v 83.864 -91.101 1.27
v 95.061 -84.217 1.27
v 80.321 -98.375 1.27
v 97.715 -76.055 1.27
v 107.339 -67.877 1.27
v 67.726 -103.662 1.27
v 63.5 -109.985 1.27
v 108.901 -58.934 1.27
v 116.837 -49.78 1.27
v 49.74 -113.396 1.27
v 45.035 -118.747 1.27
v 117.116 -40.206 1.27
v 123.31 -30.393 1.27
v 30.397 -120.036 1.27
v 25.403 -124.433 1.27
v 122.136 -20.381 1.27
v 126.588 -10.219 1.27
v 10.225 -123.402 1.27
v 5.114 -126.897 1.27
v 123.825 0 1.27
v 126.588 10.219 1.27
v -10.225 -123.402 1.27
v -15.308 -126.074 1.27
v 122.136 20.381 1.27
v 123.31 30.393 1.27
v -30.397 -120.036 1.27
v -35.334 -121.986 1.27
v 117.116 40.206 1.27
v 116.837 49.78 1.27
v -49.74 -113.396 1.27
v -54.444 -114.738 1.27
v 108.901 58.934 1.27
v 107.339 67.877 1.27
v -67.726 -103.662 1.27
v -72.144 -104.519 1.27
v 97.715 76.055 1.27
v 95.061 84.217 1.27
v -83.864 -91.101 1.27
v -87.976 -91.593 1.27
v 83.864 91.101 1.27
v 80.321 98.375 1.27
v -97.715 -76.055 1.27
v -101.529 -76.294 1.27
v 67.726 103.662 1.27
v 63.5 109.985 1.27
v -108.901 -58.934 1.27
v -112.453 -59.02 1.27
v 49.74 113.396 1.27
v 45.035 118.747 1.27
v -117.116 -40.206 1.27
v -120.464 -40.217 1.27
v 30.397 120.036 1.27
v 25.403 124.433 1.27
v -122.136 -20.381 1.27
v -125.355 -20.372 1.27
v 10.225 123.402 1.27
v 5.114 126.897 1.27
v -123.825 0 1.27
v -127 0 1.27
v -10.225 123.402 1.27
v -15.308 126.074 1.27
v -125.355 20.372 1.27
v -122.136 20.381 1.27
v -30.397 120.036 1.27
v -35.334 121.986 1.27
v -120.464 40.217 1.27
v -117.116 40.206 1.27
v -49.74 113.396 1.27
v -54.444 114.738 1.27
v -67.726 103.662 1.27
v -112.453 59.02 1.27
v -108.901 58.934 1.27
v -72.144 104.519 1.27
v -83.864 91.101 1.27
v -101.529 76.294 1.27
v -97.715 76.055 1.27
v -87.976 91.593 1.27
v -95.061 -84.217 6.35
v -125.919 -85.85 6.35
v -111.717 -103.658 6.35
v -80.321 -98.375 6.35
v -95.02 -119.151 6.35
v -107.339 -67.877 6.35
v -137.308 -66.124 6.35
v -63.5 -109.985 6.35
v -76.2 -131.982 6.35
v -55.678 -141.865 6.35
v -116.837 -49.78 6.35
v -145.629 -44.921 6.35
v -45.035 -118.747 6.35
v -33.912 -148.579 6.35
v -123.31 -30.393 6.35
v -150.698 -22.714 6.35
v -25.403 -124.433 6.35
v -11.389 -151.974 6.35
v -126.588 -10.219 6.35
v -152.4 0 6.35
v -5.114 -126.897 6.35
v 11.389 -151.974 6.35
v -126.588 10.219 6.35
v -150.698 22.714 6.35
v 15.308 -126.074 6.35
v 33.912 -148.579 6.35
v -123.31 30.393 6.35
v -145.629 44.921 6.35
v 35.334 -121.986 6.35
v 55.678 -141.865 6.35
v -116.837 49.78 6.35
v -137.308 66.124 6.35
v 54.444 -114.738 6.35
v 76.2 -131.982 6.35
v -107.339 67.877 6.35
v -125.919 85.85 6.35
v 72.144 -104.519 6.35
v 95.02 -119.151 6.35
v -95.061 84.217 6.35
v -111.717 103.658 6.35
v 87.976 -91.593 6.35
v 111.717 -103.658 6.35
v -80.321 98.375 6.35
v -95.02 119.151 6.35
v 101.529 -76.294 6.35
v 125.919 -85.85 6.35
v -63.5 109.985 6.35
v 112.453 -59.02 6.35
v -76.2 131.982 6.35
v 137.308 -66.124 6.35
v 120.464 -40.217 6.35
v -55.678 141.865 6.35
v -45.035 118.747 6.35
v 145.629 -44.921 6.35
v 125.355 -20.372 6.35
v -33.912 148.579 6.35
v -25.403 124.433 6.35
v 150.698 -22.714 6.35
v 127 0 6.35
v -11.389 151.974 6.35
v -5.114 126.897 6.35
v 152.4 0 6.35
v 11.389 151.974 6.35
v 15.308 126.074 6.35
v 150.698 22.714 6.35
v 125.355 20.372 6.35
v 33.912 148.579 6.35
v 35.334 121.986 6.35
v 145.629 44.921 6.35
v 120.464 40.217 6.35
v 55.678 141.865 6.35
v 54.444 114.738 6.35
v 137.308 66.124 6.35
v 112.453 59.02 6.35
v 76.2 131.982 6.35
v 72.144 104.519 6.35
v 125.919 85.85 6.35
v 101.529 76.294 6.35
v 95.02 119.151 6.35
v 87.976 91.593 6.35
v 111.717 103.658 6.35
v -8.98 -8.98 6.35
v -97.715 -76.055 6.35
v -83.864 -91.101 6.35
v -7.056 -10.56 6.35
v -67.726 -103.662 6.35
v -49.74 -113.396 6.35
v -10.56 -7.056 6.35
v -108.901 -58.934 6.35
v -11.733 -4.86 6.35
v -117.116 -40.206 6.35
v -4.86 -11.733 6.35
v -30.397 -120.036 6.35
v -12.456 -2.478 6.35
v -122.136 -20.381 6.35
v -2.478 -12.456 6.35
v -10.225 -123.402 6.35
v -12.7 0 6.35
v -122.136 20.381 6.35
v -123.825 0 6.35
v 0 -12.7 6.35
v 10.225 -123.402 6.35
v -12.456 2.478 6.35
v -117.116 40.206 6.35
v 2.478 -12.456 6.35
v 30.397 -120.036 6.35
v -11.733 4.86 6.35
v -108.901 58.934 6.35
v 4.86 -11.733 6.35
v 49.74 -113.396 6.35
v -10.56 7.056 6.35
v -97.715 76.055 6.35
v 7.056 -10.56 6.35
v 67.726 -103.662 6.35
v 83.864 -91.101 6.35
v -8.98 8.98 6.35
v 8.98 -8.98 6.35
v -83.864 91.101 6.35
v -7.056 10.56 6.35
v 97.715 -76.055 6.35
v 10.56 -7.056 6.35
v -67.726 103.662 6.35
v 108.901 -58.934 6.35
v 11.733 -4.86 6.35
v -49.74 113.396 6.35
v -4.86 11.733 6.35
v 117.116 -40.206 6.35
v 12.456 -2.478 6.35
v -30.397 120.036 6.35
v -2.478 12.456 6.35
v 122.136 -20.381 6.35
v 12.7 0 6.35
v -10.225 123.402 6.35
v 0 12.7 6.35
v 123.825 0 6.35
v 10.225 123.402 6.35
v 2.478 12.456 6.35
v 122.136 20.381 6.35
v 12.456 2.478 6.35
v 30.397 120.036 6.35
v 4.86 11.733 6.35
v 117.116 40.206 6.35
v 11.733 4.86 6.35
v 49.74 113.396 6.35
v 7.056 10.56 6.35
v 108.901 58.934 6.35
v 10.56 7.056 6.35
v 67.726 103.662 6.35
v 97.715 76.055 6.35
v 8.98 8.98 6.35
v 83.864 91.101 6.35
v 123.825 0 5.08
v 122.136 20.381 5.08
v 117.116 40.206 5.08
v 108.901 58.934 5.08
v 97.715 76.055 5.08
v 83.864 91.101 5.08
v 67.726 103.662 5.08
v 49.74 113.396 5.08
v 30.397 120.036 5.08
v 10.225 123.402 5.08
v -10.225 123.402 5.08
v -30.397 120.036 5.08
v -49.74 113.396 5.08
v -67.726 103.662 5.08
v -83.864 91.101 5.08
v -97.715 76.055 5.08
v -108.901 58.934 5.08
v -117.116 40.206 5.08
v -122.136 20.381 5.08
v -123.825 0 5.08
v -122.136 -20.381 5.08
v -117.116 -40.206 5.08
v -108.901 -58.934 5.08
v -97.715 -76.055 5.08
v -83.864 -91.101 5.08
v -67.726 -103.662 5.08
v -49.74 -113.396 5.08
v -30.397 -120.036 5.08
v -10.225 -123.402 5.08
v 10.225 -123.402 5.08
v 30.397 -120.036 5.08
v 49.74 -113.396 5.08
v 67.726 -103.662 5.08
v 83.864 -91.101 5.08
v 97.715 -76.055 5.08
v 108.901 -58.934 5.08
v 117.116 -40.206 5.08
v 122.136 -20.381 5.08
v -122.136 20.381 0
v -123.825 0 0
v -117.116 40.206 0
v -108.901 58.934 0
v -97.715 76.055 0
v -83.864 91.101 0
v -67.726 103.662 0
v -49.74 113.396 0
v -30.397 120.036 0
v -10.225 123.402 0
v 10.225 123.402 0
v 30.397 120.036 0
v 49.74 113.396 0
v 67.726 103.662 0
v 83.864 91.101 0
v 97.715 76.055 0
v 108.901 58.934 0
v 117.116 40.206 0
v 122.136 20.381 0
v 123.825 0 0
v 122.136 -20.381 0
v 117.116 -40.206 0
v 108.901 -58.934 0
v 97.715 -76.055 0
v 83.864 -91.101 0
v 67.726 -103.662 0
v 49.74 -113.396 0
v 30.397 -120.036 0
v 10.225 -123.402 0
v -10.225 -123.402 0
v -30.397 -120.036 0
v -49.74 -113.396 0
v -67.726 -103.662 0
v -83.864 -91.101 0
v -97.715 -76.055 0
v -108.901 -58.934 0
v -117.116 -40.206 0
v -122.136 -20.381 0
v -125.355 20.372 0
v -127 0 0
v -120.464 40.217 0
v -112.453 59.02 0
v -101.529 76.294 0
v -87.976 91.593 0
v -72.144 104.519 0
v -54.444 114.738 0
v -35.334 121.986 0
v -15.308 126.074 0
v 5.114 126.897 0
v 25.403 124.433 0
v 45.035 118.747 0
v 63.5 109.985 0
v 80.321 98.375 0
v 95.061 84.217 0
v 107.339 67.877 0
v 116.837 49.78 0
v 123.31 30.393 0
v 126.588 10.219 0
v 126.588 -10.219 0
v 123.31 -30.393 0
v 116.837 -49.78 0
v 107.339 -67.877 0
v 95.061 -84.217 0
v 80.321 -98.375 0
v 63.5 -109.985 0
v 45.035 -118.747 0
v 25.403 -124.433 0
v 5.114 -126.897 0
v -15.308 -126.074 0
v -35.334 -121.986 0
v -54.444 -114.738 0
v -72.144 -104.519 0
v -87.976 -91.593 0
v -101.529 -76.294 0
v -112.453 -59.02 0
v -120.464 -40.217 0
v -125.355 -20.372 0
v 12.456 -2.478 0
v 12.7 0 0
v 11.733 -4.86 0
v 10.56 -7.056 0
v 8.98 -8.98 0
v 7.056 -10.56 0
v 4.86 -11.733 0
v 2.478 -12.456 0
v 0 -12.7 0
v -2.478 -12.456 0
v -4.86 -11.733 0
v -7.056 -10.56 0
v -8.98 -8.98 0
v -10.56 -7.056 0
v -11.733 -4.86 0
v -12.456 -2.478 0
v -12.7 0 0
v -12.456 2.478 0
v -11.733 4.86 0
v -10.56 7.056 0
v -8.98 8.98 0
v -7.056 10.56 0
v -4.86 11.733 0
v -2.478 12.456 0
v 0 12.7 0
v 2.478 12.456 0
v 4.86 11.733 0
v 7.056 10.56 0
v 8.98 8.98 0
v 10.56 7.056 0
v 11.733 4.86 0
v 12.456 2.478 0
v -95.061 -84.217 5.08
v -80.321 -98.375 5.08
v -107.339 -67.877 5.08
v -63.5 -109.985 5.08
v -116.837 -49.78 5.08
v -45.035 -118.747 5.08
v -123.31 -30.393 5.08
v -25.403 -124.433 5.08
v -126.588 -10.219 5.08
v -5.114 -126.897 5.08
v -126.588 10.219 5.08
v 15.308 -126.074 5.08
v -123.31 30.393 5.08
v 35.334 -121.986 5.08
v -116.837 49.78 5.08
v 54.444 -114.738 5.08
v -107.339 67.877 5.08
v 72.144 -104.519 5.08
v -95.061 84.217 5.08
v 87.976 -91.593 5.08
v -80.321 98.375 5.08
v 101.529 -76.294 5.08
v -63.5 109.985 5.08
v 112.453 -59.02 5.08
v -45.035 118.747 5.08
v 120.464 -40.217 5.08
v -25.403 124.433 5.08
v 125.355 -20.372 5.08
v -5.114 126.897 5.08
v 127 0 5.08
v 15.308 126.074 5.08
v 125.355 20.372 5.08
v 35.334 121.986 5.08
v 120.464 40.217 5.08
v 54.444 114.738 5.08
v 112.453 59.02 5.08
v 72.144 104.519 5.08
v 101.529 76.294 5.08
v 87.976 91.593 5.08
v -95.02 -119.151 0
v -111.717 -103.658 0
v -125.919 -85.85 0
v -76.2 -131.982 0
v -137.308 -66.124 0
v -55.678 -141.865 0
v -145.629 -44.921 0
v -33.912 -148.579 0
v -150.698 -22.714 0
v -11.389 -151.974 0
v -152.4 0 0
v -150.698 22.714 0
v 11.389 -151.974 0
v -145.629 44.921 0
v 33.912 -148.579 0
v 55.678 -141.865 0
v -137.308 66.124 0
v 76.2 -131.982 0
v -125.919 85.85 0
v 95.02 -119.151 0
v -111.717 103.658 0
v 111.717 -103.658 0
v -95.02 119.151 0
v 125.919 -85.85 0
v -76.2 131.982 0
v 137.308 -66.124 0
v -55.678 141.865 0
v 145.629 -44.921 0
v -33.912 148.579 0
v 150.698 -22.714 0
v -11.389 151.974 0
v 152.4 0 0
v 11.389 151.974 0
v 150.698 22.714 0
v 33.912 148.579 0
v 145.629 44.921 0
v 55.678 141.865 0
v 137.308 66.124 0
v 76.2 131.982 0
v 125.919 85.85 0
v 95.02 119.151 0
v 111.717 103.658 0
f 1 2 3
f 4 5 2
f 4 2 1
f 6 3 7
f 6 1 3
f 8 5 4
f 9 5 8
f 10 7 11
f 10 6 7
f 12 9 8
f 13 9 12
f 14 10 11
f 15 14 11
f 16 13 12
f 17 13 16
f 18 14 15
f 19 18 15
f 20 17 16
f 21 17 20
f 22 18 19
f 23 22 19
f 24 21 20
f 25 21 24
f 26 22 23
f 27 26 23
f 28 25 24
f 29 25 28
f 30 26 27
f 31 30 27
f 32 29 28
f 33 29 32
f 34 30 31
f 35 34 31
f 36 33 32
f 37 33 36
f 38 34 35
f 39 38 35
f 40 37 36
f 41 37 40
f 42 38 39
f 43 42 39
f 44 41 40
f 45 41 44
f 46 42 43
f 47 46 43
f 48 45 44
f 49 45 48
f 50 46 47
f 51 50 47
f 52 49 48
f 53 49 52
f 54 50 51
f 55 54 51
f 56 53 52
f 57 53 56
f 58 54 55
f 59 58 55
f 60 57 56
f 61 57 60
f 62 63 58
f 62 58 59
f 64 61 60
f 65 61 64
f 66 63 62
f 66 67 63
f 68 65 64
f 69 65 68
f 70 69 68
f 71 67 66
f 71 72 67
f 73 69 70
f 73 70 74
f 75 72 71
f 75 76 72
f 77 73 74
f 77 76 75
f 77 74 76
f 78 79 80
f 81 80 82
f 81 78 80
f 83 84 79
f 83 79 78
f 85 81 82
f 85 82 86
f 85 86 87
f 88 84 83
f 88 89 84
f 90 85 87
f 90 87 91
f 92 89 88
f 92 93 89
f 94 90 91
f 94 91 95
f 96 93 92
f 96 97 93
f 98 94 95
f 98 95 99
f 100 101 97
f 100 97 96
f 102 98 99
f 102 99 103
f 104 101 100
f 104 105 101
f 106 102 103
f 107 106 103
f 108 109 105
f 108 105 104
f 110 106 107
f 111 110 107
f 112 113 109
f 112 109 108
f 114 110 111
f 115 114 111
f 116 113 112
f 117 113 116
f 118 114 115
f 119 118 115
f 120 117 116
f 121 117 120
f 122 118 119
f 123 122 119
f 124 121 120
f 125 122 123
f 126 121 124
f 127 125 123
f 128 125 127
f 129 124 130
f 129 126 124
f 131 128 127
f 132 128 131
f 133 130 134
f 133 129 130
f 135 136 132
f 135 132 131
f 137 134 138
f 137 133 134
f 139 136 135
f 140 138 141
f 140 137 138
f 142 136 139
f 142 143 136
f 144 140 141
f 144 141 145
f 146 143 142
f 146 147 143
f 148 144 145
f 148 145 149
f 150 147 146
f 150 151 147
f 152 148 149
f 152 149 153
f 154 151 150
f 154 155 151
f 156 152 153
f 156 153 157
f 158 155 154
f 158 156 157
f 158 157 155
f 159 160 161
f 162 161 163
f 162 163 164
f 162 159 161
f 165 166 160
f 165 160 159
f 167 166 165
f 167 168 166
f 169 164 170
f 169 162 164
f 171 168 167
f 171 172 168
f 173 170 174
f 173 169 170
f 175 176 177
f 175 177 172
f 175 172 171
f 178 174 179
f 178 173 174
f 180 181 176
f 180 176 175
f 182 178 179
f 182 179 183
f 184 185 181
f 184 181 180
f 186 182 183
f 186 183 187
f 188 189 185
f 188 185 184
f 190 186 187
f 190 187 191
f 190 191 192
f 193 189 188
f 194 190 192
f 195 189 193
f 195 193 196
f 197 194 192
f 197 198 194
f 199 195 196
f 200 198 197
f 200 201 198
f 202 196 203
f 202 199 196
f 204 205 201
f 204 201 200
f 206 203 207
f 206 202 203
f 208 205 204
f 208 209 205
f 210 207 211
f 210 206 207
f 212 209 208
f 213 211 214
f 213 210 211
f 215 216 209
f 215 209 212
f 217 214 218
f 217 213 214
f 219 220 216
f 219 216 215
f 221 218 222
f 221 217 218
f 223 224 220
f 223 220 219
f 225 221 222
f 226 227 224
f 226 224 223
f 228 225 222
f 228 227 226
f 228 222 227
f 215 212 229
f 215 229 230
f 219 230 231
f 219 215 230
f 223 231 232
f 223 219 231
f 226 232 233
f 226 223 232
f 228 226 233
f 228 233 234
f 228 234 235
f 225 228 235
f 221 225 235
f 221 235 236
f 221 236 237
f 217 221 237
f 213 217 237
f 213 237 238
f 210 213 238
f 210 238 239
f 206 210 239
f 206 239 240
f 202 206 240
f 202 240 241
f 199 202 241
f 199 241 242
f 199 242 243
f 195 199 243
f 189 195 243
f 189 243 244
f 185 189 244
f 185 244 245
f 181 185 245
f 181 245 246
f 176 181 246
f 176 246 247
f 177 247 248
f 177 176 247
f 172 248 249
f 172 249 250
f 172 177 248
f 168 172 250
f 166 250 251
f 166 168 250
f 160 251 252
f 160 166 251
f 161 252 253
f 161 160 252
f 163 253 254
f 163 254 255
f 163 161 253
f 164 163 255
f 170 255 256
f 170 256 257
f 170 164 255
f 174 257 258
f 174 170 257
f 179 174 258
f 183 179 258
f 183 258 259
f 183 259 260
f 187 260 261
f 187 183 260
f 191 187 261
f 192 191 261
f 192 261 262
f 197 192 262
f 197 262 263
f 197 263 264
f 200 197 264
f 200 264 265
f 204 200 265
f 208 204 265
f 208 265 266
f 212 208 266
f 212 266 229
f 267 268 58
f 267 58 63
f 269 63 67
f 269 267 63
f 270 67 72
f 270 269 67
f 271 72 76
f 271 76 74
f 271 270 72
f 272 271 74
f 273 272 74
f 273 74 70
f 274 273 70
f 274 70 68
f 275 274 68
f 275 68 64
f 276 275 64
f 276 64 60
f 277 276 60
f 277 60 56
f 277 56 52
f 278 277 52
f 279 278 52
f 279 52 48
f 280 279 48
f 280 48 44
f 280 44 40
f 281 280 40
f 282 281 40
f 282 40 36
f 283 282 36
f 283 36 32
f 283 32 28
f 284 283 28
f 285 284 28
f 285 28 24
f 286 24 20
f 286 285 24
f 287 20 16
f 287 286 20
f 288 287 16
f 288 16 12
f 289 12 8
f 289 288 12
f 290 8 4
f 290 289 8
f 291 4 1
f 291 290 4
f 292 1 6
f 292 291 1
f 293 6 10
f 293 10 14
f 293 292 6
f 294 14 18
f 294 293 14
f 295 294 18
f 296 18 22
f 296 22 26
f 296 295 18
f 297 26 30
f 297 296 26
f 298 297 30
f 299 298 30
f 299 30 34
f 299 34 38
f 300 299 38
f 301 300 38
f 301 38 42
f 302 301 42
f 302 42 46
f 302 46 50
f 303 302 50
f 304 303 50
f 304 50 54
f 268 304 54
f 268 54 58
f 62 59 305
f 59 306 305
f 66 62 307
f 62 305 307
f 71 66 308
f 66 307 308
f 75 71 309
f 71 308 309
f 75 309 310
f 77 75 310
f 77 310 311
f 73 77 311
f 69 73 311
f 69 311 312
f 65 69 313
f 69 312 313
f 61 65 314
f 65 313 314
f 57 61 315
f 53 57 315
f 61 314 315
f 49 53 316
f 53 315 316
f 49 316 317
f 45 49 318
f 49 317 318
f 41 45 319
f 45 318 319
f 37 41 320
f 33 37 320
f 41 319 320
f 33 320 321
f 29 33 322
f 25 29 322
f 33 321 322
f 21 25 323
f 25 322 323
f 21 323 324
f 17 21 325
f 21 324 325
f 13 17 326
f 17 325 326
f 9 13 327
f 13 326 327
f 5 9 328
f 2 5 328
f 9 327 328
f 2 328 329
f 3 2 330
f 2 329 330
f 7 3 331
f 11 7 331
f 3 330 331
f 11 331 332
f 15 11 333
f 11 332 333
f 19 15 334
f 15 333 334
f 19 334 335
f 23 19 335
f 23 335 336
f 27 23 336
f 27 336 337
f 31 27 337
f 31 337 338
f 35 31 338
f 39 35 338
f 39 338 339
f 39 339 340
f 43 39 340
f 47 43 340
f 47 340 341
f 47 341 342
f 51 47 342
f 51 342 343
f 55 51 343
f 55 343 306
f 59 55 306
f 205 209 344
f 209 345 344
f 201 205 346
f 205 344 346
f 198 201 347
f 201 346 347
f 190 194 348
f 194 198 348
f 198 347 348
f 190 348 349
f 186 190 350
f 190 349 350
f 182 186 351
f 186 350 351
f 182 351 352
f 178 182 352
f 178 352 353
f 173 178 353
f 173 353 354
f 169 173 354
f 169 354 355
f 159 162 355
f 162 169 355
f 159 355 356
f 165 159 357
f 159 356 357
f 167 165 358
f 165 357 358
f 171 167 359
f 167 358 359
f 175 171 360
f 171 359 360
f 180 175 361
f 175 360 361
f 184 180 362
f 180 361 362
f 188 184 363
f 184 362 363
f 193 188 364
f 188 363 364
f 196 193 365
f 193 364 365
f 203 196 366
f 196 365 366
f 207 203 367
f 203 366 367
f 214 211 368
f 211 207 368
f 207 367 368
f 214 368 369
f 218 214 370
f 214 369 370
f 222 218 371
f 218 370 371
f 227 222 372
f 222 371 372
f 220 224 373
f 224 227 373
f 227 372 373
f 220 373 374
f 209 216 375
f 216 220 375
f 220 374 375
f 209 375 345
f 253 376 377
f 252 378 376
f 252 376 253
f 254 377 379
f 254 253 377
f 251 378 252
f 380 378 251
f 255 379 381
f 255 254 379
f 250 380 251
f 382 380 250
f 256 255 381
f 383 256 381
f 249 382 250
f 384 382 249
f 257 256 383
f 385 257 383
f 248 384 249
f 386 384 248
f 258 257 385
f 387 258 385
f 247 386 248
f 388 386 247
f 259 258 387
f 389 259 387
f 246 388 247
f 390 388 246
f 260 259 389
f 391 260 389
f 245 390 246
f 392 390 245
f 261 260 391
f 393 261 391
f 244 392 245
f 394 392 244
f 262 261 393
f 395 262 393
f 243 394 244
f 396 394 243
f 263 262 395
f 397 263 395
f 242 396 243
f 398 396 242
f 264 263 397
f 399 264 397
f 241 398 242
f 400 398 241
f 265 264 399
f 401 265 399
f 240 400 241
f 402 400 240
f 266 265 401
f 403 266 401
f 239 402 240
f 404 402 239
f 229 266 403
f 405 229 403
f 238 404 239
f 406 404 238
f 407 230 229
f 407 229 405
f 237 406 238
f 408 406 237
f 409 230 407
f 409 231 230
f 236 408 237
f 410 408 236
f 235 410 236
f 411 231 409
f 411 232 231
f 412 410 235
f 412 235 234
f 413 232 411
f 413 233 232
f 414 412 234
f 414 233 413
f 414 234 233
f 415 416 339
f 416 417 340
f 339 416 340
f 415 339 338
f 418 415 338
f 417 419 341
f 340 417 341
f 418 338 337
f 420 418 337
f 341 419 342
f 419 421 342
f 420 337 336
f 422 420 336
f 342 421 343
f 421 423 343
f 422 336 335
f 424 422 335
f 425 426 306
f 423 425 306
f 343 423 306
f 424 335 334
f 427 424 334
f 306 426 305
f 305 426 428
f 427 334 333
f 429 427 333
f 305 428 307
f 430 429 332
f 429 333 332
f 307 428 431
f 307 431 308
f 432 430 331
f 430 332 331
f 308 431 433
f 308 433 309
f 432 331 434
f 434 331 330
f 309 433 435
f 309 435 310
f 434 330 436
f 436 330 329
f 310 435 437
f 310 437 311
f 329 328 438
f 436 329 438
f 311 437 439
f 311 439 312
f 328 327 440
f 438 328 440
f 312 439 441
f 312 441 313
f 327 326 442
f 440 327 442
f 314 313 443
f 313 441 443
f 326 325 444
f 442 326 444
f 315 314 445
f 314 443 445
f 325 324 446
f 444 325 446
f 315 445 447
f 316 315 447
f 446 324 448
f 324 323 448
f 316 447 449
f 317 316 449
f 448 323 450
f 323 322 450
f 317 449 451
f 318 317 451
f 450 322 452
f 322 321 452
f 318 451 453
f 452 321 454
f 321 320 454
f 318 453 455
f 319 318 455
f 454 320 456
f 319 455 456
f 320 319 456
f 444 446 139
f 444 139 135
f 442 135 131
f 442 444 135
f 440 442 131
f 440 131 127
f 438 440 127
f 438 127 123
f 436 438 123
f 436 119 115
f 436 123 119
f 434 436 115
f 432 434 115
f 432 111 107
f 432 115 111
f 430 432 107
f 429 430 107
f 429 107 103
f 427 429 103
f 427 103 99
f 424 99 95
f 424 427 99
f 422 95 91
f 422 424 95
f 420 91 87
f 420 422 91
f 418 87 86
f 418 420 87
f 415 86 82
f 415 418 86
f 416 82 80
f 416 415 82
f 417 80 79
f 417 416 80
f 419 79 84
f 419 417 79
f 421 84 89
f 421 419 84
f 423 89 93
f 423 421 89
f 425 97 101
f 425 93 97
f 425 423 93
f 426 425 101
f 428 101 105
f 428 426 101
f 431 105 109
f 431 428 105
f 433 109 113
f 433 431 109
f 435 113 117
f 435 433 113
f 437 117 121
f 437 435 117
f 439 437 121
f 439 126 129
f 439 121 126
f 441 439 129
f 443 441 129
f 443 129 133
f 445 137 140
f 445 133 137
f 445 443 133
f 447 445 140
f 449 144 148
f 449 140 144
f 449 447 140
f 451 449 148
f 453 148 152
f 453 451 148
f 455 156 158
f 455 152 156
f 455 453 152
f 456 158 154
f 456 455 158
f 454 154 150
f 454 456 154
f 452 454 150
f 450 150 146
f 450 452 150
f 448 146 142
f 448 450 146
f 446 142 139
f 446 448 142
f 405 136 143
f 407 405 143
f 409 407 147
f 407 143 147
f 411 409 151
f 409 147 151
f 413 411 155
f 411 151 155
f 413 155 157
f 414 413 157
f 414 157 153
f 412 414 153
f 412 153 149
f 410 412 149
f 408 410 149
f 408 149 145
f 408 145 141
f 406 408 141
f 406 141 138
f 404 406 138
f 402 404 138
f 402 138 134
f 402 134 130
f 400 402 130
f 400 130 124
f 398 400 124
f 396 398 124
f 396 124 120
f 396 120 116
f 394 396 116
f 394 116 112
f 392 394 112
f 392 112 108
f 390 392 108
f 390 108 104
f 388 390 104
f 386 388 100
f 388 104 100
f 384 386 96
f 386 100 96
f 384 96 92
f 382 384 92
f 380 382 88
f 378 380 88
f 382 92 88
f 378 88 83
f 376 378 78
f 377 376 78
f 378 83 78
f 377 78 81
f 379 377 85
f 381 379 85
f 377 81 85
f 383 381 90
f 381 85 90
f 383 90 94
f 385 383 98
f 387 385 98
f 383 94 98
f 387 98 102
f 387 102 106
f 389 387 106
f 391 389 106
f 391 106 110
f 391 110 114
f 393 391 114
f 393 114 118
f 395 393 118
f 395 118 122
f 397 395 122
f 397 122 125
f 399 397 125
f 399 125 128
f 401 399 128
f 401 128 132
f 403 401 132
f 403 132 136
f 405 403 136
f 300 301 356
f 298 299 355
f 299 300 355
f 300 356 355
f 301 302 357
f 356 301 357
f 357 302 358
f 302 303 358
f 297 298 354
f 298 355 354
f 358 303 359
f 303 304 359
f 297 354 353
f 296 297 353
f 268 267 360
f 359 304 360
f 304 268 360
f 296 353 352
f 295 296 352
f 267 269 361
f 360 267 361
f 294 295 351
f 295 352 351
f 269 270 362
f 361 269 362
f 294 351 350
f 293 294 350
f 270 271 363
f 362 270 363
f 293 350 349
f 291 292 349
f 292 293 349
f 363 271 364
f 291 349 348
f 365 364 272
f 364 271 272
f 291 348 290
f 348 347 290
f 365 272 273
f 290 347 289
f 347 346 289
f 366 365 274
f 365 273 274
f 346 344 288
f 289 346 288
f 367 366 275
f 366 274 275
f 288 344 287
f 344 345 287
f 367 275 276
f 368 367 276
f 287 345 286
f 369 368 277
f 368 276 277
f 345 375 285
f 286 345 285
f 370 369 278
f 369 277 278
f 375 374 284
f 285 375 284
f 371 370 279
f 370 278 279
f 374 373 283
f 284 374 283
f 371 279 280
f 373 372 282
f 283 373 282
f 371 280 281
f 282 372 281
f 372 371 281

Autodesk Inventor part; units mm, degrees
ref_plane "YZ Plane" through (0, 0, 0) normal (1, 0, 0) x (0, 1, 0)
ref_plane "XZ Plane" through (0, 0, 0) normal (0, 1, 0) x (-1, 0, 0)
ref_plane "XY Plane" through (0, 0, 0) normal (0, 0, 1) x (1, 0, 0)
sketch "Sketch1" plane through (0, 0, 0) normal (0, 0, 1) x (1, 0, 0)
  circle A0 centre (0, 0) radius 152.4
  circle A1 centre (0, 0) radius 12.7
  dimension "d0" = 304.8
  dimension "d1" = 25.4
extrude "Extrusion1" add sketch "Sketch1" along normal blind 6.35
sketch "Sketch2" plane through (0, 0, 6.35) normal (0, 0, 1) x (1, 0, 0)
  point P0 (0, 0)
sketch "Sketch3" plane through (0, 0, 6.35) normal (0, 0, 1) x (1, 0, 0)
  circle A0 centre (0, 0) radius 127
  circle A1 centre (0, 0) radius 123.825
  dimension "d4" = 254
  dimension "d5" = 247.65
extrude "Extrusion2" cut sketch "Sketch3" against normal blind 1.27
sketch "Sketch4" plane through (0, 0, 0) normal (0, 0, -1) x (-1, 0, 0)
  circle A0 centre (0, 0) radius 152.4
  circle A1 centre (0, 0) radius 127
  circle A2 centre (0, 0) radius 123.825
  dimension "d8" = 254
  dimension "d9" = 247.65
extrude "Extrusion3" cut sketch "Sketch4" against normal blind 1.27 contours A1
properties part number "Plate"
